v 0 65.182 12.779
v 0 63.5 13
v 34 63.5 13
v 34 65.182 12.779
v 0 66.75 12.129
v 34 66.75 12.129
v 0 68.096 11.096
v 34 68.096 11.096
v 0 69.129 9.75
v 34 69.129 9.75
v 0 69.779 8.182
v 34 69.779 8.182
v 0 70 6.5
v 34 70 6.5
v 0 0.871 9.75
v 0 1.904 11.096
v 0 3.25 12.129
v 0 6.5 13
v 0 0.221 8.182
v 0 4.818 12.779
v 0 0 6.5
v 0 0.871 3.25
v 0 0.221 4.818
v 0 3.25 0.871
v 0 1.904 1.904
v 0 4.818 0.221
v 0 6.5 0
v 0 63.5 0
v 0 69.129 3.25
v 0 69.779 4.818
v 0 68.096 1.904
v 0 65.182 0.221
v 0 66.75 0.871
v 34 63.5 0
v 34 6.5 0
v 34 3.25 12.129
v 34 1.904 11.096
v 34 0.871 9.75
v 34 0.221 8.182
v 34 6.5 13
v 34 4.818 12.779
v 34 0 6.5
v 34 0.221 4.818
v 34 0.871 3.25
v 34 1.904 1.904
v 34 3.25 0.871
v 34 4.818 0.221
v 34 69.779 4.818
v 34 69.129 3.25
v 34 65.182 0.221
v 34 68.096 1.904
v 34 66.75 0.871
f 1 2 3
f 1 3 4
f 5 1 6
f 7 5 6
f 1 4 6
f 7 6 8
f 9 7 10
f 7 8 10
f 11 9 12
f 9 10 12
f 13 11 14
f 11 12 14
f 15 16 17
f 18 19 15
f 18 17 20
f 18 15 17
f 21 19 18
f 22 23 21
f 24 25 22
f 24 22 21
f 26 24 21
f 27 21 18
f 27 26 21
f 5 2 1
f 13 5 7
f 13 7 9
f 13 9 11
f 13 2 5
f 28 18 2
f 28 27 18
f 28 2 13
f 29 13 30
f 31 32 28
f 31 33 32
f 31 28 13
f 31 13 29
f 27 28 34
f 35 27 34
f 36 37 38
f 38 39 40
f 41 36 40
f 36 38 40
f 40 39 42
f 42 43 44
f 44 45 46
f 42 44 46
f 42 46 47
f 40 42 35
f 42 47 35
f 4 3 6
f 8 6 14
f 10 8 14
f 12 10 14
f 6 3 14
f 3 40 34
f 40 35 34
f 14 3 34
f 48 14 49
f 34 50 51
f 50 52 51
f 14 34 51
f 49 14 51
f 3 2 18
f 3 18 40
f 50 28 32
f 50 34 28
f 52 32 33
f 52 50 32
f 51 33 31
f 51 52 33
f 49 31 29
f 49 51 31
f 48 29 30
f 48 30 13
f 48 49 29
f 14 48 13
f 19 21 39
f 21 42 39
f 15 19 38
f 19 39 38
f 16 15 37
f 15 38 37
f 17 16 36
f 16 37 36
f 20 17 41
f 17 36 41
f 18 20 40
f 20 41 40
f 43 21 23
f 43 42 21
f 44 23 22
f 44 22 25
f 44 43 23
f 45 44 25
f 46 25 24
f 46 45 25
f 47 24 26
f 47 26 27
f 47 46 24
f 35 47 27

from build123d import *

# Parameters (mm, degrees)
F0_W     = 34
F0_H     = 70
F1_DEPTH = 13
F2_R     = 6.49999
F3_R     = 6.49999


# Not quite as in the source:
# - a fillet or chamfer is up to 0.001 mm smaller than in the source, because OpenCascade refuses the exact size


with BuildPart() as f1:
    # F0 (on Top) → F1 (new body)
    with BuildSketch(Plane.XY):
        with Locations((17, 35)):
            Rectangle(F0_W, F0_H)
    extrude(amount=F1_DEPTH)

    # F2 (radius 6.5 in the source; OpenCascade refuses exactly that, so slightly less here)
    f2_edges = [f1.edges().sort_by_distance(p)[0] for p in [
        (17, 0, 13),
        (17, 0, 0),
    ]]
    fillet(f2_edges, radius=F2_R)

    # F3 (radius 6.5 in the source; OpenCascade refuses exactly that, so slightly less here)
    f3_edges = [f1.edges().sort_by_distance(p)[0] for p in [
        (17, 70, 13),
        (17, 70, 0),
    ]]
    fillet(f3_edges, radius=F3_R)


solid = f1.part
